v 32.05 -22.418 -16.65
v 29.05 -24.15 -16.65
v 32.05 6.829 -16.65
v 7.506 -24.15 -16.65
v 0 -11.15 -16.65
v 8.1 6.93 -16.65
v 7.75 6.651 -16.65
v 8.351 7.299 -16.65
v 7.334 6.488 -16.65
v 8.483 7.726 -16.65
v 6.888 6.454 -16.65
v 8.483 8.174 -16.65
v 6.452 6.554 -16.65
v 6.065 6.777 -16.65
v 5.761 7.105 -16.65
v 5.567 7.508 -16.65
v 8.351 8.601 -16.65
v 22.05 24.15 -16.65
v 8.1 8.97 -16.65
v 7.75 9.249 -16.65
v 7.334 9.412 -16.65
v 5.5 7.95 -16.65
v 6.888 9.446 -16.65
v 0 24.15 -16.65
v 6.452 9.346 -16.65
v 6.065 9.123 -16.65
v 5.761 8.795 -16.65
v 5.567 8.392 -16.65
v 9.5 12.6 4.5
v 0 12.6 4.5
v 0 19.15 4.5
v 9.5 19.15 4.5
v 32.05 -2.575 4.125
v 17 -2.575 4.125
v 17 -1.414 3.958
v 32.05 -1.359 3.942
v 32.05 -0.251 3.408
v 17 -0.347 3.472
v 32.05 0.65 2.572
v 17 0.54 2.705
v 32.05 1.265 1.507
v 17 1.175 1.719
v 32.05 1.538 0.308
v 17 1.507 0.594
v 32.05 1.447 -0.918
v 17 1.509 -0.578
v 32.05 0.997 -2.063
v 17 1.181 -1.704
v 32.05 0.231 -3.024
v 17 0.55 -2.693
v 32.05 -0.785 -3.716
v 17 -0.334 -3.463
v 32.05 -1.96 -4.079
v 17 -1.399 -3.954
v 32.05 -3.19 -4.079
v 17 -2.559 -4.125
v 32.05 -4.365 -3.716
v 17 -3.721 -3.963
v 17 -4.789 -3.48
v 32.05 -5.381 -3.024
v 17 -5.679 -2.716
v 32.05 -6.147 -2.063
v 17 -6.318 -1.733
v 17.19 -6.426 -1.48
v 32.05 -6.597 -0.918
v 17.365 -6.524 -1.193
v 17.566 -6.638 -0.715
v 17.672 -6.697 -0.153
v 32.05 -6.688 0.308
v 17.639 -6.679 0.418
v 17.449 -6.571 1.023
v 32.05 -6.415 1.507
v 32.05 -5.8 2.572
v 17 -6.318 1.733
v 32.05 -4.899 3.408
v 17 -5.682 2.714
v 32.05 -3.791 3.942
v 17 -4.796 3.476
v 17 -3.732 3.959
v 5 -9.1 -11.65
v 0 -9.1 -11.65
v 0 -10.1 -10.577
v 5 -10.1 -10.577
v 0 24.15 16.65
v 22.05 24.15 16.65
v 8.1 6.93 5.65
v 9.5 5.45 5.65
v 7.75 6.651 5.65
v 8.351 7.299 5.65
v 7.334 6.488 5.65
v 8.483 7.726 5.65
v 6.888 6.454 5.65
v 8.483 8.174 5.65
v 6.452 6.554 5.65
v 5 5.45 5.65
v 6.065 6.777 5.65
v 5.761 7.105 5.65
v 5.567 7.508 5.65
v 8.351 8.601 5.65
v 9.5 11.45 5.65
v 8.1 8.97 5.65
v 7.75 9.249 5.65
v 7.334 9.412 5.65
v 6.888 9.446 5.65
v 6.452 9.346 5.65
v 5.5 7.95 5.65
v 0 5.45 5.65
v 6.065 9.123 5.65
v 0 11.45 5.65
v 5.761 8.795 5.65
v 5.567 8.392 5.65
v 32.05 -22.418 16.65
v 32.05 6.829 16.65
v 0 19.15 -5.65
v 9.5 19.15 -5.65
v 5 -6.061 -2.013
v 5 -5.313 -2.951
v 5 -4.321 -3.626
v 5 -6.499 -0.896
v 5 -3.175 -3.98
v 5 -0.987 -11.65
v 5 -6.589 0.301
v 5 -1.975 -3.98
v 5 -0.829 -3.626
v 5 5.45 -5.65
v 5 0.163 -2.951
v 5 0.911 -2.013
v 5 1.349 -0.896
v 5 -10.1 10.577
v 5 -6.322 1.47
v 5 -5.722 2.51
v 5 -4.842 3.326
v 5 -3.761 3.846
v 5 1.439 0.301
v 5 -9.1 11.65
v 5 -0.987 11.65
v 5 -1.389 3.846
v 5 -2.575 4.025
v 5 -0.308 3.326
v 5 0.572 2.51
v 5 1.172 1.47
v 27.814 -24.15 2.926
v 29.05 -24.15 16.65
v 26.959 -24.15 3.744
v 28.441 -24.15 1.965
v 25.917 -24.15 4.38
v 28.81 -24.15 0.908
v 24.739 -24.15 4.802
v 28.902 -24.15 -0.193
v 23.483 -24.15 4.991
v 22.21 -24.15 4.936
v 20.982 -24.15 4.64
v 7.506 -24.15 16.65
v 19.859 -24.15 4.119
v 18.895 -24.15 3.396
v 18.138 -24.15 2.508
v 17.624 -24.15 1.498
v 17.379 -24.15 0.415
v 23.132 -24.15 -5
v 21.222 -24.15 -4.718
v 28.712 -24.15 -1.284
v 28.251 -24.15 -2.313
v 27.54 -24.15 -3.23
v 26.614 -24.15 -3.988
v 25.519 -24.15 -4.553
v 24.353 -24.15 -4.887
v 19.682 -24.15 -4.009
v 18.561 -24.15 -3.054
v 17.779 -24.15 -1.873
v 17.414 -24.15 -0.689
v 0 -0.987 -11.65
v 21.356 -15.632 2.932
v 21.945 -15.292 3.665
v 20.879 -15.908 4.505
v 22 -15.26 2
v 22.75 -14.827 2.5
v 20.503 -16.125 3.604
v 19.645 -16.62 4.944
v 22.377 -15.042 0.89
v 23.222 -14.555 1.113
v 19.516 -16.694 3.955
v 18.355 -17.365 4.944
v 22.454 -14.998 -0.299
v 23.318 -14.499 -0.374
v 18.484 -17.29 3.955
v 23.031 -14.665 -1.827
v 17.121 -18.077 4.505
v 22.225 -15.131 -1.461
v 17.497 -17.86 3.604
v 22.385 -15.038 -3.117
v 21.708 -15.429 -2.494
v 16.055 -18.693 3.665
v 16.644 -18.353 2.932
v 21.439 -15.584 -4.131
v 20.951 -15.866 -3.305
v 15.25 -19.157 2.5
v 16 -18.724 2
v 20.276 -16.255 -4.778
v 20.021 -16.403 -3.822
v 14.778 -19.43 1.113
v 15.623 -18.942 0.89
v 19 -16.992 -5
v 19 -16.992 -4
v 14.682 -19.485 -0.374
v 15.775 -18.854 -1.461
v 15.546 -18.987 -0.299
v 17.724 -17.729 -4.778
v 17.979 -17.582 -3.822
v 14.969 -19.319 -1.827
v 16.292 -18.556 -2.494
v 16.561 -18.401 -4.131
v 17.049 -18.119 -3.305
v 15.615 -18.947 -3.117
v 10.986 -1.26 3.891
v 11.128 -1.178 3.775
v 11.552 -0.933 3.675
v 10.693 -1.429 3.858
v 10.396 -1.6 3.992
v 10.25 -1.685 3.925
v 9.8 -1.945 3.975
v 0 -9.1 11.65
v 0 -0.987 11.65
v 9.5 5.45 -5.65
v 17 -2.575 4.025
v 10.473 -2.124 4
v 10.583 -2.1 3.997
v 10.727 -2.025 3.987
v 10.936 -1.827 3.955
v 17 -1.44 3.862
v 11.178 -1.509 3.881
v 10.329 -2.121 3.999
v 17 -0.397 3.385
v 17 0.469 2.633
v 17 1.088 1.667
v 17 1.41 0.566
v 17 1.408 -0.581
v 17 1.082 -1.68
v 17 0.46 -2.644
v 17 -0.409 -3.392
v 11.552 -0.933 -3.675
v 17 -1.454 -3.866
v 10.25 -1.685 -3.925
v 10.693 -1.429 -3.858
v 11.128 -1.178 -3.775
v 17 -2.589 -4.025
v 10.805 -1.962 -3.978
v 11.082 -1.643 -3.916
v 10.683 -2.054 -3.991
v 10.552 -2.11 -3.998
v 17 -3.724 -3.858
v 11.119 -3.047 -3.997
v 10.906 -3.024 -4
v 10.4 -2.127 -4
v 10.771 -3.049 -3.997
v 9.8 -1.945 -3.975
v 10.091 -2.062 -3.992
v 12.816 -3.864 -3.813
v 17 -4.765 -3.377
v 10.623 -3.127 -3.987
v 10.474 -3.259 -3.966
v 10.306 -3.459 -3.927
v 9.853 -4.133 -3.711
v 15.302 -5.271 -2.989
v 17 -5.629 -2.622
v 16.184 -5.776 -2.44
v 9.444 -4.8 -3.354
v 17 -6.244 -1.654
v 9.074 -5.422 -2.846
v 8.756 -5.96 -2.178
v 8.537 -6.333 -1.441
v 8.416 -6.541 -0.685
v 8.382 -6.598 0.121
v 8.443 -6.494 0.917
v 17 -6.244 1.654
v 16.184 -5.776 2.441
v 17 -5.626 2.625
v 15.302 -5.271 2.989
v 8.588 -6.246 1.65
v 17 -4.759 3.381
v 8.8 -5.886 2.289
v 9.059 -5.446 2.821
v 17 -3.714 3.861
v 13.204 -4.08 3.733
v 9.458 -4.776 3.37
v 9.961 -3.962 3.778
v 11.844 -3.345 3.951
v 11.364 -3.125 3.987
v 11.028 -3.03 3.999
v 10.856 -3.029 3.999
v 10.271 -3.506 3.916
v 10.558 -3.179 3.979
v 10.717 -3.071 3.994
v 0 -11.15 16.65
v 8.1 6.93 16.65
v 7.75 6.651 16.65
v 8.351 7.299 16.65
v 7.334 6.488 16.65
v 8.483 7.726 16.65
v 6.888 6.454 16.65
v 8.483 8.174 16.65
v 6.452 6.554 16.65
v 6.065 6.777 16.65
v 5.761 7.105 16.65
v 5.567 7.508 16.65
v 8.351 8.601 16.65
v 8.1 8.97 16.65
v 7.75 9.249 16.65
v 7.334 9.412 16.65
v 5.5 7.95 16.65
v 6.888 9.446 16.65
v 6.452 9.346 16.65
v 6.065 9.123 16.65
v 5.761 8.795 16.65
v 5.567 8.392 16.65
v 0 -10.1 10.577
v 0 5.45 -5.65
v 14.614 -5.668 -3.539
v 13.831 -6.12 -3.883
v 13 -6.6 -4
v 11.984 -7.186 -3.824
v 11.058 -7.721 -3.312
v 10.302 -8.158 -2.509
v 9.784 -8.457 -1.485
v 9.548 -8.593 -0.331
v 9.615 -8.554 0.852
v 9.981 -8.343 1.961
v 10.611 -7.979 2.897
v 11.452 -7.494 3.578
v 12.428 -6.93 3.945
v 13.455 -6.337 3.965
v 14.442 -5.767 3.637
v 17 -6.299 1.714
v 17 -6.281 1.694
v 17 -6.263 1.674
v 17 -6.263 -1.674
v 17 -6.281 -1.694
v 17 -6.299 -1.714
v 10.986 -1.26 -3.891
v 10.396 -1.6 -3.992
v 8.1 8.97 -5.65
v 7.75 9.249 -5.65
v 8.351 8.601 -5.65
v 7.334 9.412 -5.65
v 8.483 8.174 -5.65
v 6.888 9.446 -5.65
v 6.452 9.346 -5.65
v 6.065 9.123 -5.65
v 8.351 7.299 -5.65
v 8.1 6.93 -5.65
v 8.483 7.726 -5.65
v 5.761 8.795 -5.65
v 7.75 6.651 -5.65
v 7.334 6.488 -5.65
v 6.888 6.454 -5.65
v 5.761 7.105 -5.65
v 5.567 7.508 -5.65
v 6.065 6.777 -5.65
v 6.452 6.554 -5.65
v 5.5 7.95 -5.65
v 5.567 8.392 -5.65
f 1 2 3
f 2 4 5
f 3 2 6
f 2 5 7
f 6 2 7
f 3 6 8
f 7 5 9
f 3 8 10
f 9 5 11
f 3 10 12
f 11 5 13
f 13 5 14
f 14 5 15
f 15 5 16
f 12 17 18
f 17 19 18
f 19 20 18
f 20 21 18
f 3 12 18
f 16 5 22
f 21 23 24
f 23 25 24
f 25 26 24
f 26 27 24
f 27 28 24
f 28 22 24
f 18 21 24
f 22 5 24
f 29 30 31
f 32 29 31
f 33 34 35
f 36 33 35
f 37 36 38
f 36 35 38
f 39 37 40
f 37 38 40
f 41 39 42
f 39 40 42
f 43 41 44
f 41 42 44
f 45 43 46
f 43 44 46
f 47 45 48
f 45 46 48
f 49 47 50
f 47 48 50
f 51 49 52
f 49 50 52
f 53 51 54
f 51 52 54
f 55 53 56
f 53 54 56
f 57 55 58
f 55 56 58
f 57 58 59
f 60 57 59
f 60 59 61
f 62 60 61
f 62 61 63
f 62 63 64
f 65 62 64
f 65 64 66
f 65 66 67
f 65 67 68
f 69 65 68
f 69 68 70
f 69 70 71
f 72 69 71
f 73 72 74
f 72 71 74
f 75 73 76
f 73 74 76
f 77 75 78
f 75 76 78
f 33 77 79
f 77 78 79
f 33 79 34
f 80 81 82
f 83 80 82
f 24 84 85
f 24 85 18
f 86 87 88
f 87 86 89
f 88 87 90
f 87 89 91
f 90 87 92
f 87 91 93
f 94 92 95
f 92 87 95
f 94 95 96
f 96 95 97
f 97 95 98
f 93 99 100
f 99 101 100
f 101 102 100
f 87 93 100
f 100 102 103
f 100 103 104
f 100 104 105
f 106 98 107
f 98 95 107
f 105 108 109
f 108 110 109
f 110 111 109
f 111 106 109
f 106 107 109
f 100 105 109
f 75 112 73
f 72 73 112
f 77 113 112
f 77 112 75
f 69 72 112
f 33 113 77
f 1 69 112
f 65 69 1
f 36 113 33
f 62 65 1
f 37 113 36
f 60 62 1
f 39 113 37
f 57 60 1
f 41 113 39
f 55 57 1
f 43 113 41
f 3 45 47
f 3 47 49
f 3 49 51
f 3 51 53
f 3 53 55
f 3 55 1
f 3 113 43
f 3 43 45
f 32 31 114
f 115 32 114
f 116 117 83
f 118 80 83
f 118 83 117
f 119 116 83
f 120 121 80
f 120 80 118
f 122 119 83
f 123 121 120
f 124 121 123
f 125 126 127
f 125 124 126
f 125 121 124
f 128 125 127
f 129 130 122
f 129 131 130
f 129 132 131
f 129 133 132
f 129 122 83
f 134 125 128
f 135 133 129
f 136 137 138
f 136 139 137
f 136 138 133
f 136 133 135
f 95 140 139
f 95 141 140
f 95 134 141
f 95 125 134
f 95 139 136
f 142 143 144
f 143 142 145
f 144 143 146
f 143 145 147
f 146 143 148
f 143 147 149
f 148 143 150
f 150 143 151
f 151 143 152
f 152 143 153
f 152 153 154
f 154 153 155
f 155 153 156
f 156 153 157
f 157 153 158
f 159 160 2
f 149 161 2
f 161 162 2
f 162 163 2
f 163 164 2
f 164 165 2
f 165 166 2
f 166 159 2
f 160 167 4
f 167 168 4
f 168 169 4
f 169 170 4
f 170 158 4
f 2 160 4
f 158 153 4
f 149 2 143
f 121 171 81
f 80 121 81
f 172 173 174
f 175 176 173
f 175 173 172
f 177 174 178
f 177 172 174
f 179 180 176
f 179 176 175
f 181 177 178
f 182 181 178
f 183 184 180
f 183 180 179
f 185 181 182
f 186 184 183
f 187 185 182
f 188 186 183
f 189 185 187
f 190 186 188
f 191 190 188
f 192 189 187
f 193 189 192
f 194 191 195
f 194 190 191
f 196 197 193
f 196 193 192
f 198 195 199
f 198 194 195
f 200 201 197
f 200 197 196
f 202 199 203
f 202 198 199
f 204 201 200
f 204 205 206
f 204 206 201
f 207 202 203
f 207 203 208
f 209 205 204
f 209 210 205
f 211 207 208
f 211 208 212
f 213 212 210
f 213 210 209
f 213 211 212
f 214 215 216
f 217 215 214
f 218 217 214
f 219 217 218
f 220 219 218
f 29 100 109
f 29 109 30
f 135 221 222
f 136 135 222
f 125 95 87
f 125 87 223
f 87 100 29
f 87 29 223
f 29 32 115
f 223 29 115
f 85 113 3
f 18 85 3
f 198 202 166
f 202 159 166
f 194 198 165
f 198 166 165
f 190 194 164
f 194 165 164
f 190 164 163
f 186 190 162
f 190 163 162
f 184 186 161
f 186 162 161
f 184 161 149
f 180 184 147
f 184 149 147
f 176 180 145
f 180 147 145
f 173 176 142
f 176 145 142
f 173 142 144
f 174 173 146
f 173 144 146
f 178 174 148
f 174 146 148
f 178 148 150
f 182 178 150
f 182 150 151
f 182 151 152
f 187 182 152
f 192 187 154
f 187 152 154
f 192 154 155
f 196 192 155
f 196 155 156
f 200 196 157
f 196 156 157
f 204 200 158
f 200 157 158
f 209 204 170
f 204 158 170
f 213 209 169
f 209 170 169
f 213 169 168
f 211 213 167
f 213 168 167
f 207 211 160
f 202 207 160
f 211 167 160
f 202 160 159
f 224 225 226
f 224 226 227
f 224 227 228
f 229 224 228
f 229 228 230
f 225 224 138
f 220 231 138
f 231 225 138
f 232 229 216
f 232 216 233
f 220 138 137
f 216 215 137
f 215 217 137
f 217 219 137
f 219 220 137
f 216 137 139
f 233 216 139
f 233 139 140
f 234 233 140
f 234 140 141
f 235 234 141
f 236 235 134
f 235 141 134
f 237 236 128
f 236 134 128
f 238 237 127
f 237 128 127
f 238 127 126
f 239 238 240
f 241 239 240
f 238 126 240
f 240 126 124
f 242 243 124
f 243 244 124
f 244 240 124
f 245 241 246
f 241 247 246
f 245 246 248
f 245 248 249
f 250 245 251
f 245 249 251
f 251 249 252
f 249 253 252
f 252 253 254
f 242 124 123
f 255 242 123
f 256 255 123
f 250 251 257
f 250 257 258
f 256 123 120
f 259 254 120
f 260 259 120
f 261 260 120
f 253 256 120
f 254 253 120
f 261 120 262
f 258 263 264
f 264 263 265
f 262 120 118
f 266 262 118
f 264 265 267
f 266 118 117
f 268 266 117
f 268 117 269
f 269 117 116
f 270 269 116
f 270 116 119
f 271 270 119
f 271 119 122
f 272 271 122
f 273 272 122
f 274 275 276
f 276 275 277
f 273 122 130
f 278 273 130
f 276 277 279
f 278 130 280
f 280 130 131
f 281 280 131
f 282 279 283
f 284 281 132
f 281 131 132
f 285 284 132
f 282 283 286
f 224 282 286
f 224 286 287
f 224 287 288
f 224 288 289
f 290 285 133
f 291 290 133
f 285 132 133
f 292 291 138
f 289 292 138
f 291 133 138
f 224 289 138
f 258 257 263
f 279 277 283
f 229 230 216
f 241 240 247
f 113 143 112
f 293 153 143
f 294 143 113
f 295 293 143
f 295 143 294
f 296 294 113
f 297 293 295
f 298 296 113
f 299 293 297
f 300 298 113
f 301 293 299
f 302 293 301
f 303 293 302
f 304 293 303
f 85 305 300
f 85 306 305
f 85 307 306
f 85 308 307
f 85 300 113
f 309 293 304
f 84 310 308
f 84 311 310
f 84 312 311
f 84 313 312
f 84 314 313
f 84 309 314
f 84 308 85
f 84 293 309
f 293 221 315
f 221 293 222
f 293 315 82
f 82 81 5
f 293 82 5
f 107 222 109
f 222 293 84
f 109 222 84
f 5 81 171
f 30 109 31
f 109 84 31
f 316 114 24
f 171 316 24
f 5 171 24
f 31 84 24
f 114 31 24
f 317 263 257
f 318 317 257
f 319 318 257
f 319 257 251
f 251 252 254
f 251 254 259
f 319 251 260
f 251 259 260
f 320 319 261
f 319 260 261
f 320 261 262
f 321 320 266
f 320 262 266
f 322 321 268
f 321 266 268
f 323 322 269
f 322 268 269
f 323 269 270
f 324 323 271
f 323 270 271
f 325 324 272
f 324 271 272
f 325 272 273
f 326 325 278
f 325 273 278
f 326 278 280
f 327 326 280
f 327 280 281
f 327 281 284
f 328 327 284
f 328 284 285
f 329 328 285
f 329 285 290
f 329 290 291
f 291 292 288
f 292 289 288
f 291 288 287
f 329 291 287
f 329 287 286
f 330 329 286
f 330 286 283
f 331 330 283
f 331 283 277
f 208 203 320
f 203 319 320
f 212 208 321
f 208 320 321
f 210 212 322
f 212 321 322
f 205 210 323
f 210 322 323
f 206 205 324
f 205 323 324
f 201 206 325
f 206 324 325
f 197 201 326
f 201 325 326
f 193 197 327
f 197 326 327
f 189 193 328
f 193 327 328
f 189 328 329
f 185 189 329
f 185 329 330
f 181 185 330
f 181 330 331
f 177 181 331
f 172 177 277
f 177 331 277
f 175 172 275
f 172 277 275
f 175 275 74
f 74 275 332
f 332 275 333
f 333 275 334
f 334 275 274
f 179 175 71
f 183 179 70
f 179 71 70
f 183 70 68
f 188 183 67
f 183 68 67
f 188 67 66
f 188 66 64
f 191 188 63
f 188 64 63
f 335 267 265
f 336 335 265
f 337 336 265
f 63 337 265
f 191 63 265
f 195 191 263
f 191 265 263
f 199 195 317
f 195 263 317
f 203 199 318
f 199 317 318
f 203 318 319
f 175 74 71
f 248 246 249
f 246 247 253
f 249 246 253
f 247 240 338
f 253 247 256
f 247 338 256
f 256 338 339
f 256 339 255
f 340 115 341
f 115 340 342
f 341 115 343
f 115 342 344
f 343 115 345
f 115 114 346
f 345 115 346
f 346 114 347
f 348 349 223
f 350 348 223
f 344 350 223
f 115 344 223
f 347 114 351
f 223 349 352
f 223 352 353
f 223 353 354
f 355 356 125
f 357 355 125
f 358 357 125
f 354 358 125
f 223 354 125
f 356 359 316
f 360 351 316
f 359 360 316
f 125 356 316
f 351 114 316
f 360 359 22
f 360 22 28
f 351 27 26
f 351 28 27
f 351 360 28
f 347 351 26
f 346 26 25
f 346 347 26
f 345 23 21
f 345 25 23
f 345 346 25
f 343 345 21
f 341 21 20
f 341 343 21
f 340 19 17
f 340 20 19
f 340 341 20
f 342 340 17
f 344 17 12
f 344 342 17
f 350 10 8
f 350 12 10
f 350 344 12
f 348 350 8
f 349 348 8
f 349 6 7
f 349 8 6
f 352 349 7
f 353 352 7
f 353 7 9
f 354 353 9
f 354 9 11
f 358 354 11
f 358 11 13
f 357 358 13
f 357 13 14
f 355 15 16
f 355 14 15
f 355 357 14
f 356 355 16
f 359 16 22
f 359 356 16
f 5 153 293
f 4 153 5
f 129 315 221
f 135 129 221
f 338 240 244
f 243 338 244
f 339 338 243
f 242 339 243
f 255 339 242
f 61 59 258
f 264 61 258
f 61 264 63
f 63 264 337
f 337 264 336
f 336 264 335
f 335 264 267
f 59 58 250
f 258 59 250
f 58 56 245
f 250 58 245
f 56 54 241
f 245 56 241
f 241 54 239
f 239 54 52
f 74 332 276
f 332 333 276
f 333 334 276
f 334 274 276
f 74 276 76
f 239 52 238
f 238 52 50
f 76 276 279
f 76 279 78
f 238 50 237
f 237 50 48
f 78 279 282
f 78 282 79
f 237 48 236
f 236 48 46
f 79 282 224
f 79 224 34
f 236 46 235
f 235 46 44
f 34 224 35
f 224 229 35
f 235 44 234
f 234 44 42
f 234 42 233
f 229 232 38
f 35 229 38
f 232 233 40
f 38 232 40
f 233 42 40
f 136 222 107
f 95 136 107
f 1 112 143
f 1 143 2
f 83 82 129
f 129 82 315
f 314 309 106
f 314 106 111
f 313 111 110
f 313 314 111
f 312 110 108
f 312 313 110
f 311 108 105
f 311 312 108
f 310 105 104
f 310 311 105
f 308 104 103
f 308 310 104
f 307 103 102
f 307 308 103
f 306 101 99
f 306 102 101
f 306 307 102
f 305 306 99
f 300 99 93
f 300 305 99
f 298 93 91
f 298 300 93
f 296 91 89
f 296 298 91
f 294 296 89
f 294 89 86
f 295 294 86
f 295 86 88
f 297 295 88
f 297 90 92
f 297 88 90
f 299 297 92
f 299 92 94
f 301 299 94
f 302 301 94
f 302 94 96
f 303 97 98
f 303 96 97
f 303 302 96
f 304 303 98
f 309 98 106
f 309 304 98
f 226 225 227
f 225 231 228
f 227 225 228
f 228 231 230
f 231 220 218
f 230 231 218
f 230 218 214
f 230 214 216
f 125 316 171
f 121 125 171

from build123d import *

# Parameters (mm, degrees)
SKETCH1_W               = 33.3
SKETCH1_H               = 48.3
BOSS_EXTRUDE1_DEPTH     = 9.55
CUT_EXTRUDE1_DEPTH      = 5
CUT_EXTRUDE2_DEPTH      = 4.5
SKETCH5_W               = 33.3
SKETCH5_H               = 48.3
BOSS_EXTRUDE3_DEPTH     = 22.5
SKETCH6_R               = 4.025
CUT_EXTRUDE3_DEPTH      = 12
SKETCH7_R               = 4.125
CUT_EXTRUDE4_DEPTH      = 15.05
CUT_EXTRUDE6_DEPTH      = 46.909857329
CUT_EXTRUDE6_DEPTH_BACK = 46.909857329
SKETCH27_R              = 1.5
SKETCH30_R              = 4
SKETCH31_R              = 5
CHAMFER1_SIZE           = 13
CHAMFER1_SIZE2          = 7.505553499
CHAMFER2_SIZE           = 10
CHAMFER2_SIZE2          = 17.320508076
CHAMFER3_SIZE           = 3
CHAMFER3_SIZE2          = 1.732050808


with BuildPart() as part:
    # Sketch1 → Boss-Extrude1 (new body)
    with BuildSketch(Plane(origin=(0, 0, 0), x_dir=(0, 0, -1), z_dir=(1, 0, 0))):
        Rectangle(SKETCH1_W, SKETCH1_H)
    extrude(amount=BOSS_EXTRUDE1_DEPTH)

    # Sketch2 → Cut-Extrude1 (cut)
    with BuildSketch(Plane.ZY):
        Polygon((0, 19.15), (-5.65, 19.15), (-5.65, 5.45), (-11.65, -0.987390776), (-11.65, -9.1), (-10.577101537, -10.1), (10.577101537, -10.1), (11.65, -9.1), (11.65, -0.987390776), (5.65, 5.45), (5.65, 11.45), (4.5, 12.6), (4.5, 19.15), align=None)
    extrude(amount=-CUT_EXTRUDE1_DEPTH, mode=Mode.SUBTRACT)

    # Sketch3 → Cut-Extrude2 (cut)
    with BuildSketch(Plane.ZY.offset(-5)):
        Polygon((-5.65, 19.15), (4.5, 19.15), (4.5, 12.6), (5.65, 11.45), (5.65, 5.45), (-5.65, 5.45), align=None)
    extrude(amount=-CUT_EXTRUDE2_DEPTH, mode=Mode.SUBTRACT)

    # Sketch5 → Boss-Extrude3 (add)
    with BuildSketch(Plane(origin=(9.55, 0, 0), x_dir=(0, 0, -1), z_dir=(1, 0, 0))):
        Rectangle(SKETCH5_W, SKETCH5_H)
    extrude(amount=BOSS_EXTRUDE3_DEPTH)

    # Sketch6 → Cut-Extrude3 (cut)
    with BuildSketch(Plane.ZY.offset(-5)):
        with Locations((0, -2.575)):
            Circle(SKETCH6_R)
    extrude(amount=-CUT_EXTRUDE3_DEPTH, mode=Mode.SUBTRACT)

    # Sketch7 → Cut-Extrude4 (cut)
    with BuildSketch(Plane.ZY.offset(-17)):
        with Locations((0, -2.575)):
            Circle(SKETCH7_R)
    extrude(amount=-CUT_EXTRUDE4_DEPTH, mode=Mode.SUBTRACT)

    # Sketch27 → Cut-Extrude6 (cut, two sides: drawn at the far end of the back side and taken through both)
    with BuildSketch(Plane(origin=(0, 0, 5.65), x_dir=(-1, 0, 0), z_dir=(0, 0, -1)).offset(-CUT_EXTRUDE6_DEPTH_BACK)):
        with Locations((-7, 7.95)):
            Circle(SKETCH27_R)
    extrude(amount=CUT_EXTRUDE6_DEPTH + CUT_EXTRUDE6_DEPTH_BACK, mode=Mode.SUBTRACT)

    # Cut-Sweep1: sweep along a path in Sketch28
    with BuildLine(Plane.XY) as cut_sweep1_path:
        Line((25.361872918, -28.011391971), (13, -6.6))
        Line((13, -6.6), (10.184139233, -1.722786085))
    # Sketch30 → Cut-Sweep1 (sweep, cut)
    with BuildSketch(Plane(origin=(18.469756751, -31.990557096, 0), x_dir=(0, 0, -1), z_dir=(0.500000000000001, -0.866025403784438, 0))):
        with Locations((0, 7.958330249)):
            Circle(SKETCH30_R)
    sweep(path=cut_sweep1_path.line, mode=Mode.SUBTRACT)

    # Cut-Sweep2: sweep along a path in Sketch29
    with BuildLine(Plane.XY) as cut_sweep2_path:
        Line((19, -16.992304845), (25.361872918, -28.011391971))
    # Sketch31 → Cut-Sweep2 (sweep, cut)
    with BuildSketch(Plane(origin=(18.469756751, -31.990557096, 0), x_dir=(0, 0, -1), z_dir=(0.500000000000001, -0.866025403784438, 0))):
        with Locations((0, 7.958330249)):
            Circle(SKETCH31_R)
    sweep(path=cut_sweep2_path.line, mode=Mode.SUBTRACT)

    # Chamfer1
    chamfer1_edges = [part.edges().sort_by_distance(p)[0] for p in [
        (0, -24.15, 0),
    ]]
    chamfer1_side = [part.faces().sort_by_distance(p)[0] for p in [
        (0, 23.563333144, 0),
    ]]
    chamfer(chamfer1_edges, length=CHAMFER1_SIZE, length2=CHAMFER1_SIZE2, reference=chamfer1_side[0])

    # Chamfer2
    chamfer2_edges = [part.edges().sort_by_distance(p)[0] for p in [
        (32.05, 24.15, 0),
    ]]
    chamfer2_side = [part.faces().sort_by_distance(p)[0] for p in [
        (16.025, 24.15, 0),
    ]]
    chamfer(chamfer2_edges, length=CHAMFER2_SIZE, length2=CHAMFER2_SIZE2, reference=chamfer2_side[0])

    # Chamfer3
    chamfer3_edges = [part.edges().sort_by_distance(p)[0] for p in [
        (32.05, -24.15, 0),
    ]]
    chamfer3_side = [part.faces().sort_by_distance(p)[0] for p in [
        (19.77777675, -24.15, -16.236318981),
    ]]
    chamfer(chamfer3_edges, length=CHAMFER3_SIZE, length2=CHAMFER3_SIZE2, reference=chamfer3_side[0])


solid = part.part
